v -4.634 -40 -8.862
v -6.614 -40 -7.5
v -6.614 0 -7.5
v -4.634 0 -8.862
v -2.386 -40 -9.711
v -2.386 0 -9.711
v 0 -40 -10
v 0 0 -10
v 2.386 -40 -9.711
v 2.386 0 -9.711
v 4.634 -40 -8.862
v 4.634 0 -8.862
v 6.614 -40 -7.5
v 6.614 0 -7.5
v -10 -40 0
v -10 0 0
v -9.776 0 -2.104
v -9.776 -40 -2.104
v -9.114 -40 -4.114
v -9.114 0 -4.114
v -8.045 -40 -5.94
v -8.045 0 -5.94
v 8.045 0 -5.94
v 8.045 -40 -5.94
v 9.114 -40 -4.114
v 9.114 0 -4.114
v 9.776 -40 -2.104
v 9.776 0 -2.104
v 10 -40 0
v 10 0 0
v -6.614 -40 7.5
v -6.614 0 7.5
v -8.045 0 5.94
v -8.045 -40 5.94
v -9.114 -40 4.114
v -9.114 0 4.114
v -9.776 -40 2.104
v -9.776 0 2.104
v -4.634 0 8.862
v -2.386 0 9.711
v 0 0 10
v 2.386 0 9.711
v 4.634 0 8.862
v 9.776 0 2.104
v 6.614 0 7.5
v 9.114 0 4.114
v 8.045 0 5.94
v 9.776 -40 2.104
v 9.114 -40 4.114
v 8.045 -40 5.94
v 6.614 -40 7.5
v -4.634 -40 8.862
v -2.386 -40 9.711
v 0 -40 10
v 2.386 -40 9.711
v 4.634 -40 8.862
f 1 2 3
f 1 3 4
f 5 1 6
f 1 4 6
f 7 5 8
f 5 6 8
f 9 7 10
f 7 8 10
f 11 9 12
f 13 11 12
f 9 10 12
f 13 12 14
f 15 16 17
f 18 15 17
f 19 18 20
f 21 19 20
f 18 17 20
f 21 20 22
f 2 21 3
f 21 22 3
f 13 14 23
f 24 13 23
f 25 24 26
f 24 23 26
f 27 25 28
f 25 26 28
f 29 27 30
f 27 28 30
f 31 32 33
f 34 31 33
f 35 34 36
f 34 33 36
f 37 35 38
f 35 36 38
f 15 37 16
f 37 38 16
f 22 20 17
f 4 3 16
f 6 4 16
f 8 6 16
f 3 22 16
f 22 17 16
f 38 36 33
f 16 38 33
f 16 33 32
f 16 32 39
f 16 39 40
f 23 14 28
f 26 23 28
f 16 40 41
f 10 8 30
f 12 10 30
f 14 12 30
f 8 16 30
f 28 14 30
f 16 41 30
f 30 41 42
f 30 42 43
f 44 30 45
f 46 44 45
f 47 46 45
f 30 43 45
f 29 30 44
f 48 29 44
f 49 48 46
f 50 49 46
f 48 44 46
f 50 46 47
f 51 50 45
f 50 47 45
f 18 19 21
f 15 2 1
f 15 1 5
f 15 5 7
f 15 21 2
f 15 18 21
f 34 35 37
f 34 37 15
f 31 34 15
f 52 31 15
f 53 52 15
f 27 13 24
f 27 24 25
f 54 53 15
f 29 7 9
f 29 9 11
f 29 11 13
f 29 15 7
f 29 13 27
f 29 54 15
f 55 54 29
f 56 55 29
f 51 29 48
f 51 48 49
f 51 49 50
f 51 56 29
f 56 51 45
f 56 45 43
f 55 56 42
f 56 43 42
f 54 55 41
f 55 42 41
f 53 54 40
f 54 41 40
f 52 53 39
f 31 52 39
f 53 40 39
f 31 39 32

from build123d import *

# Parameters (mm, degrees)
F1_DEPTH = 40


with BuildPart() as f1:
    # F0 (on Front) → F1 (new body)
    with BuildSketch(Plane.XZ):
        with BuildLine():
            ThreePointArc((-6.6143782777, -7.5), (0, -10), (6.6143782777, -7.5))
            Line((6.6143782777, -7.5), (2.3e-08, -7.5))
            Line((2.3e-08, -7.5), (-6.6143782777, -7.5))
        make_face()
        with BuildLine():
            ThreePointArc((6.6143782777, -7.5), (9.1143782777, -4.1143782777), (10, 0))
            Line((10, 0), (7.5, 0))
            ThreePointArc((7.5, 0), (5.303300867, -5.3033008508), (2.3e-08, -7.5))
            Line((2.3e-08, -7.5), (6.6143782777, -7.5))
        make_face()
        with BuildLine():
            ThreePointArc((10, 0), (9.1143782777, 4.1143782777), (6.6143782777, 7.5))
            Line((6.6143782777, 7.5), (2.31e-08, 7.5))
            ThreePointArc((2.31e-08, 7.5), (5.3033008671, 5.3033008507), (7.5, 0))
            Line((7.5, 0), (10, 0))
        make_face()
        with BuildLine():
            Line((2.31e-08, 7.5), (6.6143782777, 7.5))
            ThreePointArc((6.6143782777, 7.5), (0, 10), (-6.6143782777, 7.5))
            Line((-6.6143782777, 7.5), (2.31e-08, 7.5))
        make_face()
        with BuildLine():
            ThreePointArc((-7.5, 0), (-5.3033008507, 5.3033008671), (2.31e-08, 7.5))
            Line((2.31e-08, 7.5), (-6.6143782777, 7.5))
            ThreePointArc((-6.6143782777, 7.5), (-9.1143782777, 4.1143782777), (-10, 0))
            Line((-10, 0), (-7.5, 0))
        make_face()
        with BuildLine():
            ThreePointArc((2.3e-08, -7.5), (-5.3033008508, -5.303300867), (-7.5, 0))
            Line((-7.5, 0), (-10, 0))
            ThreePointArc((-10, 0), (-9.1143782777, -4.1143782777), (-6.6143782777, -7.5))
            Line((-6.6143782777, -7.5), (2.3e-08, -7.5))
        make_face()
        with BuildLine():
            ThreePointArc((7.5, 0), (5.3033008671, 5.3033008507), (2.31e-08, 7.5))
            ThreePointArc((2.31e-08, 7.5), (-5.3033008507, 5.3033008671), (-7.5, 0))
            ThreePointArc((-7.5, 0), (-5.3033008508, -5.303300867), (2.3e-08, -7.5))
            ThreePointArc((2.3e-08, -7.5), (5.303300867, -5.3033008508), (7.5, 0))
        make_face()
    extrude(amount=F1_DEPTH)


solid = f1.part
